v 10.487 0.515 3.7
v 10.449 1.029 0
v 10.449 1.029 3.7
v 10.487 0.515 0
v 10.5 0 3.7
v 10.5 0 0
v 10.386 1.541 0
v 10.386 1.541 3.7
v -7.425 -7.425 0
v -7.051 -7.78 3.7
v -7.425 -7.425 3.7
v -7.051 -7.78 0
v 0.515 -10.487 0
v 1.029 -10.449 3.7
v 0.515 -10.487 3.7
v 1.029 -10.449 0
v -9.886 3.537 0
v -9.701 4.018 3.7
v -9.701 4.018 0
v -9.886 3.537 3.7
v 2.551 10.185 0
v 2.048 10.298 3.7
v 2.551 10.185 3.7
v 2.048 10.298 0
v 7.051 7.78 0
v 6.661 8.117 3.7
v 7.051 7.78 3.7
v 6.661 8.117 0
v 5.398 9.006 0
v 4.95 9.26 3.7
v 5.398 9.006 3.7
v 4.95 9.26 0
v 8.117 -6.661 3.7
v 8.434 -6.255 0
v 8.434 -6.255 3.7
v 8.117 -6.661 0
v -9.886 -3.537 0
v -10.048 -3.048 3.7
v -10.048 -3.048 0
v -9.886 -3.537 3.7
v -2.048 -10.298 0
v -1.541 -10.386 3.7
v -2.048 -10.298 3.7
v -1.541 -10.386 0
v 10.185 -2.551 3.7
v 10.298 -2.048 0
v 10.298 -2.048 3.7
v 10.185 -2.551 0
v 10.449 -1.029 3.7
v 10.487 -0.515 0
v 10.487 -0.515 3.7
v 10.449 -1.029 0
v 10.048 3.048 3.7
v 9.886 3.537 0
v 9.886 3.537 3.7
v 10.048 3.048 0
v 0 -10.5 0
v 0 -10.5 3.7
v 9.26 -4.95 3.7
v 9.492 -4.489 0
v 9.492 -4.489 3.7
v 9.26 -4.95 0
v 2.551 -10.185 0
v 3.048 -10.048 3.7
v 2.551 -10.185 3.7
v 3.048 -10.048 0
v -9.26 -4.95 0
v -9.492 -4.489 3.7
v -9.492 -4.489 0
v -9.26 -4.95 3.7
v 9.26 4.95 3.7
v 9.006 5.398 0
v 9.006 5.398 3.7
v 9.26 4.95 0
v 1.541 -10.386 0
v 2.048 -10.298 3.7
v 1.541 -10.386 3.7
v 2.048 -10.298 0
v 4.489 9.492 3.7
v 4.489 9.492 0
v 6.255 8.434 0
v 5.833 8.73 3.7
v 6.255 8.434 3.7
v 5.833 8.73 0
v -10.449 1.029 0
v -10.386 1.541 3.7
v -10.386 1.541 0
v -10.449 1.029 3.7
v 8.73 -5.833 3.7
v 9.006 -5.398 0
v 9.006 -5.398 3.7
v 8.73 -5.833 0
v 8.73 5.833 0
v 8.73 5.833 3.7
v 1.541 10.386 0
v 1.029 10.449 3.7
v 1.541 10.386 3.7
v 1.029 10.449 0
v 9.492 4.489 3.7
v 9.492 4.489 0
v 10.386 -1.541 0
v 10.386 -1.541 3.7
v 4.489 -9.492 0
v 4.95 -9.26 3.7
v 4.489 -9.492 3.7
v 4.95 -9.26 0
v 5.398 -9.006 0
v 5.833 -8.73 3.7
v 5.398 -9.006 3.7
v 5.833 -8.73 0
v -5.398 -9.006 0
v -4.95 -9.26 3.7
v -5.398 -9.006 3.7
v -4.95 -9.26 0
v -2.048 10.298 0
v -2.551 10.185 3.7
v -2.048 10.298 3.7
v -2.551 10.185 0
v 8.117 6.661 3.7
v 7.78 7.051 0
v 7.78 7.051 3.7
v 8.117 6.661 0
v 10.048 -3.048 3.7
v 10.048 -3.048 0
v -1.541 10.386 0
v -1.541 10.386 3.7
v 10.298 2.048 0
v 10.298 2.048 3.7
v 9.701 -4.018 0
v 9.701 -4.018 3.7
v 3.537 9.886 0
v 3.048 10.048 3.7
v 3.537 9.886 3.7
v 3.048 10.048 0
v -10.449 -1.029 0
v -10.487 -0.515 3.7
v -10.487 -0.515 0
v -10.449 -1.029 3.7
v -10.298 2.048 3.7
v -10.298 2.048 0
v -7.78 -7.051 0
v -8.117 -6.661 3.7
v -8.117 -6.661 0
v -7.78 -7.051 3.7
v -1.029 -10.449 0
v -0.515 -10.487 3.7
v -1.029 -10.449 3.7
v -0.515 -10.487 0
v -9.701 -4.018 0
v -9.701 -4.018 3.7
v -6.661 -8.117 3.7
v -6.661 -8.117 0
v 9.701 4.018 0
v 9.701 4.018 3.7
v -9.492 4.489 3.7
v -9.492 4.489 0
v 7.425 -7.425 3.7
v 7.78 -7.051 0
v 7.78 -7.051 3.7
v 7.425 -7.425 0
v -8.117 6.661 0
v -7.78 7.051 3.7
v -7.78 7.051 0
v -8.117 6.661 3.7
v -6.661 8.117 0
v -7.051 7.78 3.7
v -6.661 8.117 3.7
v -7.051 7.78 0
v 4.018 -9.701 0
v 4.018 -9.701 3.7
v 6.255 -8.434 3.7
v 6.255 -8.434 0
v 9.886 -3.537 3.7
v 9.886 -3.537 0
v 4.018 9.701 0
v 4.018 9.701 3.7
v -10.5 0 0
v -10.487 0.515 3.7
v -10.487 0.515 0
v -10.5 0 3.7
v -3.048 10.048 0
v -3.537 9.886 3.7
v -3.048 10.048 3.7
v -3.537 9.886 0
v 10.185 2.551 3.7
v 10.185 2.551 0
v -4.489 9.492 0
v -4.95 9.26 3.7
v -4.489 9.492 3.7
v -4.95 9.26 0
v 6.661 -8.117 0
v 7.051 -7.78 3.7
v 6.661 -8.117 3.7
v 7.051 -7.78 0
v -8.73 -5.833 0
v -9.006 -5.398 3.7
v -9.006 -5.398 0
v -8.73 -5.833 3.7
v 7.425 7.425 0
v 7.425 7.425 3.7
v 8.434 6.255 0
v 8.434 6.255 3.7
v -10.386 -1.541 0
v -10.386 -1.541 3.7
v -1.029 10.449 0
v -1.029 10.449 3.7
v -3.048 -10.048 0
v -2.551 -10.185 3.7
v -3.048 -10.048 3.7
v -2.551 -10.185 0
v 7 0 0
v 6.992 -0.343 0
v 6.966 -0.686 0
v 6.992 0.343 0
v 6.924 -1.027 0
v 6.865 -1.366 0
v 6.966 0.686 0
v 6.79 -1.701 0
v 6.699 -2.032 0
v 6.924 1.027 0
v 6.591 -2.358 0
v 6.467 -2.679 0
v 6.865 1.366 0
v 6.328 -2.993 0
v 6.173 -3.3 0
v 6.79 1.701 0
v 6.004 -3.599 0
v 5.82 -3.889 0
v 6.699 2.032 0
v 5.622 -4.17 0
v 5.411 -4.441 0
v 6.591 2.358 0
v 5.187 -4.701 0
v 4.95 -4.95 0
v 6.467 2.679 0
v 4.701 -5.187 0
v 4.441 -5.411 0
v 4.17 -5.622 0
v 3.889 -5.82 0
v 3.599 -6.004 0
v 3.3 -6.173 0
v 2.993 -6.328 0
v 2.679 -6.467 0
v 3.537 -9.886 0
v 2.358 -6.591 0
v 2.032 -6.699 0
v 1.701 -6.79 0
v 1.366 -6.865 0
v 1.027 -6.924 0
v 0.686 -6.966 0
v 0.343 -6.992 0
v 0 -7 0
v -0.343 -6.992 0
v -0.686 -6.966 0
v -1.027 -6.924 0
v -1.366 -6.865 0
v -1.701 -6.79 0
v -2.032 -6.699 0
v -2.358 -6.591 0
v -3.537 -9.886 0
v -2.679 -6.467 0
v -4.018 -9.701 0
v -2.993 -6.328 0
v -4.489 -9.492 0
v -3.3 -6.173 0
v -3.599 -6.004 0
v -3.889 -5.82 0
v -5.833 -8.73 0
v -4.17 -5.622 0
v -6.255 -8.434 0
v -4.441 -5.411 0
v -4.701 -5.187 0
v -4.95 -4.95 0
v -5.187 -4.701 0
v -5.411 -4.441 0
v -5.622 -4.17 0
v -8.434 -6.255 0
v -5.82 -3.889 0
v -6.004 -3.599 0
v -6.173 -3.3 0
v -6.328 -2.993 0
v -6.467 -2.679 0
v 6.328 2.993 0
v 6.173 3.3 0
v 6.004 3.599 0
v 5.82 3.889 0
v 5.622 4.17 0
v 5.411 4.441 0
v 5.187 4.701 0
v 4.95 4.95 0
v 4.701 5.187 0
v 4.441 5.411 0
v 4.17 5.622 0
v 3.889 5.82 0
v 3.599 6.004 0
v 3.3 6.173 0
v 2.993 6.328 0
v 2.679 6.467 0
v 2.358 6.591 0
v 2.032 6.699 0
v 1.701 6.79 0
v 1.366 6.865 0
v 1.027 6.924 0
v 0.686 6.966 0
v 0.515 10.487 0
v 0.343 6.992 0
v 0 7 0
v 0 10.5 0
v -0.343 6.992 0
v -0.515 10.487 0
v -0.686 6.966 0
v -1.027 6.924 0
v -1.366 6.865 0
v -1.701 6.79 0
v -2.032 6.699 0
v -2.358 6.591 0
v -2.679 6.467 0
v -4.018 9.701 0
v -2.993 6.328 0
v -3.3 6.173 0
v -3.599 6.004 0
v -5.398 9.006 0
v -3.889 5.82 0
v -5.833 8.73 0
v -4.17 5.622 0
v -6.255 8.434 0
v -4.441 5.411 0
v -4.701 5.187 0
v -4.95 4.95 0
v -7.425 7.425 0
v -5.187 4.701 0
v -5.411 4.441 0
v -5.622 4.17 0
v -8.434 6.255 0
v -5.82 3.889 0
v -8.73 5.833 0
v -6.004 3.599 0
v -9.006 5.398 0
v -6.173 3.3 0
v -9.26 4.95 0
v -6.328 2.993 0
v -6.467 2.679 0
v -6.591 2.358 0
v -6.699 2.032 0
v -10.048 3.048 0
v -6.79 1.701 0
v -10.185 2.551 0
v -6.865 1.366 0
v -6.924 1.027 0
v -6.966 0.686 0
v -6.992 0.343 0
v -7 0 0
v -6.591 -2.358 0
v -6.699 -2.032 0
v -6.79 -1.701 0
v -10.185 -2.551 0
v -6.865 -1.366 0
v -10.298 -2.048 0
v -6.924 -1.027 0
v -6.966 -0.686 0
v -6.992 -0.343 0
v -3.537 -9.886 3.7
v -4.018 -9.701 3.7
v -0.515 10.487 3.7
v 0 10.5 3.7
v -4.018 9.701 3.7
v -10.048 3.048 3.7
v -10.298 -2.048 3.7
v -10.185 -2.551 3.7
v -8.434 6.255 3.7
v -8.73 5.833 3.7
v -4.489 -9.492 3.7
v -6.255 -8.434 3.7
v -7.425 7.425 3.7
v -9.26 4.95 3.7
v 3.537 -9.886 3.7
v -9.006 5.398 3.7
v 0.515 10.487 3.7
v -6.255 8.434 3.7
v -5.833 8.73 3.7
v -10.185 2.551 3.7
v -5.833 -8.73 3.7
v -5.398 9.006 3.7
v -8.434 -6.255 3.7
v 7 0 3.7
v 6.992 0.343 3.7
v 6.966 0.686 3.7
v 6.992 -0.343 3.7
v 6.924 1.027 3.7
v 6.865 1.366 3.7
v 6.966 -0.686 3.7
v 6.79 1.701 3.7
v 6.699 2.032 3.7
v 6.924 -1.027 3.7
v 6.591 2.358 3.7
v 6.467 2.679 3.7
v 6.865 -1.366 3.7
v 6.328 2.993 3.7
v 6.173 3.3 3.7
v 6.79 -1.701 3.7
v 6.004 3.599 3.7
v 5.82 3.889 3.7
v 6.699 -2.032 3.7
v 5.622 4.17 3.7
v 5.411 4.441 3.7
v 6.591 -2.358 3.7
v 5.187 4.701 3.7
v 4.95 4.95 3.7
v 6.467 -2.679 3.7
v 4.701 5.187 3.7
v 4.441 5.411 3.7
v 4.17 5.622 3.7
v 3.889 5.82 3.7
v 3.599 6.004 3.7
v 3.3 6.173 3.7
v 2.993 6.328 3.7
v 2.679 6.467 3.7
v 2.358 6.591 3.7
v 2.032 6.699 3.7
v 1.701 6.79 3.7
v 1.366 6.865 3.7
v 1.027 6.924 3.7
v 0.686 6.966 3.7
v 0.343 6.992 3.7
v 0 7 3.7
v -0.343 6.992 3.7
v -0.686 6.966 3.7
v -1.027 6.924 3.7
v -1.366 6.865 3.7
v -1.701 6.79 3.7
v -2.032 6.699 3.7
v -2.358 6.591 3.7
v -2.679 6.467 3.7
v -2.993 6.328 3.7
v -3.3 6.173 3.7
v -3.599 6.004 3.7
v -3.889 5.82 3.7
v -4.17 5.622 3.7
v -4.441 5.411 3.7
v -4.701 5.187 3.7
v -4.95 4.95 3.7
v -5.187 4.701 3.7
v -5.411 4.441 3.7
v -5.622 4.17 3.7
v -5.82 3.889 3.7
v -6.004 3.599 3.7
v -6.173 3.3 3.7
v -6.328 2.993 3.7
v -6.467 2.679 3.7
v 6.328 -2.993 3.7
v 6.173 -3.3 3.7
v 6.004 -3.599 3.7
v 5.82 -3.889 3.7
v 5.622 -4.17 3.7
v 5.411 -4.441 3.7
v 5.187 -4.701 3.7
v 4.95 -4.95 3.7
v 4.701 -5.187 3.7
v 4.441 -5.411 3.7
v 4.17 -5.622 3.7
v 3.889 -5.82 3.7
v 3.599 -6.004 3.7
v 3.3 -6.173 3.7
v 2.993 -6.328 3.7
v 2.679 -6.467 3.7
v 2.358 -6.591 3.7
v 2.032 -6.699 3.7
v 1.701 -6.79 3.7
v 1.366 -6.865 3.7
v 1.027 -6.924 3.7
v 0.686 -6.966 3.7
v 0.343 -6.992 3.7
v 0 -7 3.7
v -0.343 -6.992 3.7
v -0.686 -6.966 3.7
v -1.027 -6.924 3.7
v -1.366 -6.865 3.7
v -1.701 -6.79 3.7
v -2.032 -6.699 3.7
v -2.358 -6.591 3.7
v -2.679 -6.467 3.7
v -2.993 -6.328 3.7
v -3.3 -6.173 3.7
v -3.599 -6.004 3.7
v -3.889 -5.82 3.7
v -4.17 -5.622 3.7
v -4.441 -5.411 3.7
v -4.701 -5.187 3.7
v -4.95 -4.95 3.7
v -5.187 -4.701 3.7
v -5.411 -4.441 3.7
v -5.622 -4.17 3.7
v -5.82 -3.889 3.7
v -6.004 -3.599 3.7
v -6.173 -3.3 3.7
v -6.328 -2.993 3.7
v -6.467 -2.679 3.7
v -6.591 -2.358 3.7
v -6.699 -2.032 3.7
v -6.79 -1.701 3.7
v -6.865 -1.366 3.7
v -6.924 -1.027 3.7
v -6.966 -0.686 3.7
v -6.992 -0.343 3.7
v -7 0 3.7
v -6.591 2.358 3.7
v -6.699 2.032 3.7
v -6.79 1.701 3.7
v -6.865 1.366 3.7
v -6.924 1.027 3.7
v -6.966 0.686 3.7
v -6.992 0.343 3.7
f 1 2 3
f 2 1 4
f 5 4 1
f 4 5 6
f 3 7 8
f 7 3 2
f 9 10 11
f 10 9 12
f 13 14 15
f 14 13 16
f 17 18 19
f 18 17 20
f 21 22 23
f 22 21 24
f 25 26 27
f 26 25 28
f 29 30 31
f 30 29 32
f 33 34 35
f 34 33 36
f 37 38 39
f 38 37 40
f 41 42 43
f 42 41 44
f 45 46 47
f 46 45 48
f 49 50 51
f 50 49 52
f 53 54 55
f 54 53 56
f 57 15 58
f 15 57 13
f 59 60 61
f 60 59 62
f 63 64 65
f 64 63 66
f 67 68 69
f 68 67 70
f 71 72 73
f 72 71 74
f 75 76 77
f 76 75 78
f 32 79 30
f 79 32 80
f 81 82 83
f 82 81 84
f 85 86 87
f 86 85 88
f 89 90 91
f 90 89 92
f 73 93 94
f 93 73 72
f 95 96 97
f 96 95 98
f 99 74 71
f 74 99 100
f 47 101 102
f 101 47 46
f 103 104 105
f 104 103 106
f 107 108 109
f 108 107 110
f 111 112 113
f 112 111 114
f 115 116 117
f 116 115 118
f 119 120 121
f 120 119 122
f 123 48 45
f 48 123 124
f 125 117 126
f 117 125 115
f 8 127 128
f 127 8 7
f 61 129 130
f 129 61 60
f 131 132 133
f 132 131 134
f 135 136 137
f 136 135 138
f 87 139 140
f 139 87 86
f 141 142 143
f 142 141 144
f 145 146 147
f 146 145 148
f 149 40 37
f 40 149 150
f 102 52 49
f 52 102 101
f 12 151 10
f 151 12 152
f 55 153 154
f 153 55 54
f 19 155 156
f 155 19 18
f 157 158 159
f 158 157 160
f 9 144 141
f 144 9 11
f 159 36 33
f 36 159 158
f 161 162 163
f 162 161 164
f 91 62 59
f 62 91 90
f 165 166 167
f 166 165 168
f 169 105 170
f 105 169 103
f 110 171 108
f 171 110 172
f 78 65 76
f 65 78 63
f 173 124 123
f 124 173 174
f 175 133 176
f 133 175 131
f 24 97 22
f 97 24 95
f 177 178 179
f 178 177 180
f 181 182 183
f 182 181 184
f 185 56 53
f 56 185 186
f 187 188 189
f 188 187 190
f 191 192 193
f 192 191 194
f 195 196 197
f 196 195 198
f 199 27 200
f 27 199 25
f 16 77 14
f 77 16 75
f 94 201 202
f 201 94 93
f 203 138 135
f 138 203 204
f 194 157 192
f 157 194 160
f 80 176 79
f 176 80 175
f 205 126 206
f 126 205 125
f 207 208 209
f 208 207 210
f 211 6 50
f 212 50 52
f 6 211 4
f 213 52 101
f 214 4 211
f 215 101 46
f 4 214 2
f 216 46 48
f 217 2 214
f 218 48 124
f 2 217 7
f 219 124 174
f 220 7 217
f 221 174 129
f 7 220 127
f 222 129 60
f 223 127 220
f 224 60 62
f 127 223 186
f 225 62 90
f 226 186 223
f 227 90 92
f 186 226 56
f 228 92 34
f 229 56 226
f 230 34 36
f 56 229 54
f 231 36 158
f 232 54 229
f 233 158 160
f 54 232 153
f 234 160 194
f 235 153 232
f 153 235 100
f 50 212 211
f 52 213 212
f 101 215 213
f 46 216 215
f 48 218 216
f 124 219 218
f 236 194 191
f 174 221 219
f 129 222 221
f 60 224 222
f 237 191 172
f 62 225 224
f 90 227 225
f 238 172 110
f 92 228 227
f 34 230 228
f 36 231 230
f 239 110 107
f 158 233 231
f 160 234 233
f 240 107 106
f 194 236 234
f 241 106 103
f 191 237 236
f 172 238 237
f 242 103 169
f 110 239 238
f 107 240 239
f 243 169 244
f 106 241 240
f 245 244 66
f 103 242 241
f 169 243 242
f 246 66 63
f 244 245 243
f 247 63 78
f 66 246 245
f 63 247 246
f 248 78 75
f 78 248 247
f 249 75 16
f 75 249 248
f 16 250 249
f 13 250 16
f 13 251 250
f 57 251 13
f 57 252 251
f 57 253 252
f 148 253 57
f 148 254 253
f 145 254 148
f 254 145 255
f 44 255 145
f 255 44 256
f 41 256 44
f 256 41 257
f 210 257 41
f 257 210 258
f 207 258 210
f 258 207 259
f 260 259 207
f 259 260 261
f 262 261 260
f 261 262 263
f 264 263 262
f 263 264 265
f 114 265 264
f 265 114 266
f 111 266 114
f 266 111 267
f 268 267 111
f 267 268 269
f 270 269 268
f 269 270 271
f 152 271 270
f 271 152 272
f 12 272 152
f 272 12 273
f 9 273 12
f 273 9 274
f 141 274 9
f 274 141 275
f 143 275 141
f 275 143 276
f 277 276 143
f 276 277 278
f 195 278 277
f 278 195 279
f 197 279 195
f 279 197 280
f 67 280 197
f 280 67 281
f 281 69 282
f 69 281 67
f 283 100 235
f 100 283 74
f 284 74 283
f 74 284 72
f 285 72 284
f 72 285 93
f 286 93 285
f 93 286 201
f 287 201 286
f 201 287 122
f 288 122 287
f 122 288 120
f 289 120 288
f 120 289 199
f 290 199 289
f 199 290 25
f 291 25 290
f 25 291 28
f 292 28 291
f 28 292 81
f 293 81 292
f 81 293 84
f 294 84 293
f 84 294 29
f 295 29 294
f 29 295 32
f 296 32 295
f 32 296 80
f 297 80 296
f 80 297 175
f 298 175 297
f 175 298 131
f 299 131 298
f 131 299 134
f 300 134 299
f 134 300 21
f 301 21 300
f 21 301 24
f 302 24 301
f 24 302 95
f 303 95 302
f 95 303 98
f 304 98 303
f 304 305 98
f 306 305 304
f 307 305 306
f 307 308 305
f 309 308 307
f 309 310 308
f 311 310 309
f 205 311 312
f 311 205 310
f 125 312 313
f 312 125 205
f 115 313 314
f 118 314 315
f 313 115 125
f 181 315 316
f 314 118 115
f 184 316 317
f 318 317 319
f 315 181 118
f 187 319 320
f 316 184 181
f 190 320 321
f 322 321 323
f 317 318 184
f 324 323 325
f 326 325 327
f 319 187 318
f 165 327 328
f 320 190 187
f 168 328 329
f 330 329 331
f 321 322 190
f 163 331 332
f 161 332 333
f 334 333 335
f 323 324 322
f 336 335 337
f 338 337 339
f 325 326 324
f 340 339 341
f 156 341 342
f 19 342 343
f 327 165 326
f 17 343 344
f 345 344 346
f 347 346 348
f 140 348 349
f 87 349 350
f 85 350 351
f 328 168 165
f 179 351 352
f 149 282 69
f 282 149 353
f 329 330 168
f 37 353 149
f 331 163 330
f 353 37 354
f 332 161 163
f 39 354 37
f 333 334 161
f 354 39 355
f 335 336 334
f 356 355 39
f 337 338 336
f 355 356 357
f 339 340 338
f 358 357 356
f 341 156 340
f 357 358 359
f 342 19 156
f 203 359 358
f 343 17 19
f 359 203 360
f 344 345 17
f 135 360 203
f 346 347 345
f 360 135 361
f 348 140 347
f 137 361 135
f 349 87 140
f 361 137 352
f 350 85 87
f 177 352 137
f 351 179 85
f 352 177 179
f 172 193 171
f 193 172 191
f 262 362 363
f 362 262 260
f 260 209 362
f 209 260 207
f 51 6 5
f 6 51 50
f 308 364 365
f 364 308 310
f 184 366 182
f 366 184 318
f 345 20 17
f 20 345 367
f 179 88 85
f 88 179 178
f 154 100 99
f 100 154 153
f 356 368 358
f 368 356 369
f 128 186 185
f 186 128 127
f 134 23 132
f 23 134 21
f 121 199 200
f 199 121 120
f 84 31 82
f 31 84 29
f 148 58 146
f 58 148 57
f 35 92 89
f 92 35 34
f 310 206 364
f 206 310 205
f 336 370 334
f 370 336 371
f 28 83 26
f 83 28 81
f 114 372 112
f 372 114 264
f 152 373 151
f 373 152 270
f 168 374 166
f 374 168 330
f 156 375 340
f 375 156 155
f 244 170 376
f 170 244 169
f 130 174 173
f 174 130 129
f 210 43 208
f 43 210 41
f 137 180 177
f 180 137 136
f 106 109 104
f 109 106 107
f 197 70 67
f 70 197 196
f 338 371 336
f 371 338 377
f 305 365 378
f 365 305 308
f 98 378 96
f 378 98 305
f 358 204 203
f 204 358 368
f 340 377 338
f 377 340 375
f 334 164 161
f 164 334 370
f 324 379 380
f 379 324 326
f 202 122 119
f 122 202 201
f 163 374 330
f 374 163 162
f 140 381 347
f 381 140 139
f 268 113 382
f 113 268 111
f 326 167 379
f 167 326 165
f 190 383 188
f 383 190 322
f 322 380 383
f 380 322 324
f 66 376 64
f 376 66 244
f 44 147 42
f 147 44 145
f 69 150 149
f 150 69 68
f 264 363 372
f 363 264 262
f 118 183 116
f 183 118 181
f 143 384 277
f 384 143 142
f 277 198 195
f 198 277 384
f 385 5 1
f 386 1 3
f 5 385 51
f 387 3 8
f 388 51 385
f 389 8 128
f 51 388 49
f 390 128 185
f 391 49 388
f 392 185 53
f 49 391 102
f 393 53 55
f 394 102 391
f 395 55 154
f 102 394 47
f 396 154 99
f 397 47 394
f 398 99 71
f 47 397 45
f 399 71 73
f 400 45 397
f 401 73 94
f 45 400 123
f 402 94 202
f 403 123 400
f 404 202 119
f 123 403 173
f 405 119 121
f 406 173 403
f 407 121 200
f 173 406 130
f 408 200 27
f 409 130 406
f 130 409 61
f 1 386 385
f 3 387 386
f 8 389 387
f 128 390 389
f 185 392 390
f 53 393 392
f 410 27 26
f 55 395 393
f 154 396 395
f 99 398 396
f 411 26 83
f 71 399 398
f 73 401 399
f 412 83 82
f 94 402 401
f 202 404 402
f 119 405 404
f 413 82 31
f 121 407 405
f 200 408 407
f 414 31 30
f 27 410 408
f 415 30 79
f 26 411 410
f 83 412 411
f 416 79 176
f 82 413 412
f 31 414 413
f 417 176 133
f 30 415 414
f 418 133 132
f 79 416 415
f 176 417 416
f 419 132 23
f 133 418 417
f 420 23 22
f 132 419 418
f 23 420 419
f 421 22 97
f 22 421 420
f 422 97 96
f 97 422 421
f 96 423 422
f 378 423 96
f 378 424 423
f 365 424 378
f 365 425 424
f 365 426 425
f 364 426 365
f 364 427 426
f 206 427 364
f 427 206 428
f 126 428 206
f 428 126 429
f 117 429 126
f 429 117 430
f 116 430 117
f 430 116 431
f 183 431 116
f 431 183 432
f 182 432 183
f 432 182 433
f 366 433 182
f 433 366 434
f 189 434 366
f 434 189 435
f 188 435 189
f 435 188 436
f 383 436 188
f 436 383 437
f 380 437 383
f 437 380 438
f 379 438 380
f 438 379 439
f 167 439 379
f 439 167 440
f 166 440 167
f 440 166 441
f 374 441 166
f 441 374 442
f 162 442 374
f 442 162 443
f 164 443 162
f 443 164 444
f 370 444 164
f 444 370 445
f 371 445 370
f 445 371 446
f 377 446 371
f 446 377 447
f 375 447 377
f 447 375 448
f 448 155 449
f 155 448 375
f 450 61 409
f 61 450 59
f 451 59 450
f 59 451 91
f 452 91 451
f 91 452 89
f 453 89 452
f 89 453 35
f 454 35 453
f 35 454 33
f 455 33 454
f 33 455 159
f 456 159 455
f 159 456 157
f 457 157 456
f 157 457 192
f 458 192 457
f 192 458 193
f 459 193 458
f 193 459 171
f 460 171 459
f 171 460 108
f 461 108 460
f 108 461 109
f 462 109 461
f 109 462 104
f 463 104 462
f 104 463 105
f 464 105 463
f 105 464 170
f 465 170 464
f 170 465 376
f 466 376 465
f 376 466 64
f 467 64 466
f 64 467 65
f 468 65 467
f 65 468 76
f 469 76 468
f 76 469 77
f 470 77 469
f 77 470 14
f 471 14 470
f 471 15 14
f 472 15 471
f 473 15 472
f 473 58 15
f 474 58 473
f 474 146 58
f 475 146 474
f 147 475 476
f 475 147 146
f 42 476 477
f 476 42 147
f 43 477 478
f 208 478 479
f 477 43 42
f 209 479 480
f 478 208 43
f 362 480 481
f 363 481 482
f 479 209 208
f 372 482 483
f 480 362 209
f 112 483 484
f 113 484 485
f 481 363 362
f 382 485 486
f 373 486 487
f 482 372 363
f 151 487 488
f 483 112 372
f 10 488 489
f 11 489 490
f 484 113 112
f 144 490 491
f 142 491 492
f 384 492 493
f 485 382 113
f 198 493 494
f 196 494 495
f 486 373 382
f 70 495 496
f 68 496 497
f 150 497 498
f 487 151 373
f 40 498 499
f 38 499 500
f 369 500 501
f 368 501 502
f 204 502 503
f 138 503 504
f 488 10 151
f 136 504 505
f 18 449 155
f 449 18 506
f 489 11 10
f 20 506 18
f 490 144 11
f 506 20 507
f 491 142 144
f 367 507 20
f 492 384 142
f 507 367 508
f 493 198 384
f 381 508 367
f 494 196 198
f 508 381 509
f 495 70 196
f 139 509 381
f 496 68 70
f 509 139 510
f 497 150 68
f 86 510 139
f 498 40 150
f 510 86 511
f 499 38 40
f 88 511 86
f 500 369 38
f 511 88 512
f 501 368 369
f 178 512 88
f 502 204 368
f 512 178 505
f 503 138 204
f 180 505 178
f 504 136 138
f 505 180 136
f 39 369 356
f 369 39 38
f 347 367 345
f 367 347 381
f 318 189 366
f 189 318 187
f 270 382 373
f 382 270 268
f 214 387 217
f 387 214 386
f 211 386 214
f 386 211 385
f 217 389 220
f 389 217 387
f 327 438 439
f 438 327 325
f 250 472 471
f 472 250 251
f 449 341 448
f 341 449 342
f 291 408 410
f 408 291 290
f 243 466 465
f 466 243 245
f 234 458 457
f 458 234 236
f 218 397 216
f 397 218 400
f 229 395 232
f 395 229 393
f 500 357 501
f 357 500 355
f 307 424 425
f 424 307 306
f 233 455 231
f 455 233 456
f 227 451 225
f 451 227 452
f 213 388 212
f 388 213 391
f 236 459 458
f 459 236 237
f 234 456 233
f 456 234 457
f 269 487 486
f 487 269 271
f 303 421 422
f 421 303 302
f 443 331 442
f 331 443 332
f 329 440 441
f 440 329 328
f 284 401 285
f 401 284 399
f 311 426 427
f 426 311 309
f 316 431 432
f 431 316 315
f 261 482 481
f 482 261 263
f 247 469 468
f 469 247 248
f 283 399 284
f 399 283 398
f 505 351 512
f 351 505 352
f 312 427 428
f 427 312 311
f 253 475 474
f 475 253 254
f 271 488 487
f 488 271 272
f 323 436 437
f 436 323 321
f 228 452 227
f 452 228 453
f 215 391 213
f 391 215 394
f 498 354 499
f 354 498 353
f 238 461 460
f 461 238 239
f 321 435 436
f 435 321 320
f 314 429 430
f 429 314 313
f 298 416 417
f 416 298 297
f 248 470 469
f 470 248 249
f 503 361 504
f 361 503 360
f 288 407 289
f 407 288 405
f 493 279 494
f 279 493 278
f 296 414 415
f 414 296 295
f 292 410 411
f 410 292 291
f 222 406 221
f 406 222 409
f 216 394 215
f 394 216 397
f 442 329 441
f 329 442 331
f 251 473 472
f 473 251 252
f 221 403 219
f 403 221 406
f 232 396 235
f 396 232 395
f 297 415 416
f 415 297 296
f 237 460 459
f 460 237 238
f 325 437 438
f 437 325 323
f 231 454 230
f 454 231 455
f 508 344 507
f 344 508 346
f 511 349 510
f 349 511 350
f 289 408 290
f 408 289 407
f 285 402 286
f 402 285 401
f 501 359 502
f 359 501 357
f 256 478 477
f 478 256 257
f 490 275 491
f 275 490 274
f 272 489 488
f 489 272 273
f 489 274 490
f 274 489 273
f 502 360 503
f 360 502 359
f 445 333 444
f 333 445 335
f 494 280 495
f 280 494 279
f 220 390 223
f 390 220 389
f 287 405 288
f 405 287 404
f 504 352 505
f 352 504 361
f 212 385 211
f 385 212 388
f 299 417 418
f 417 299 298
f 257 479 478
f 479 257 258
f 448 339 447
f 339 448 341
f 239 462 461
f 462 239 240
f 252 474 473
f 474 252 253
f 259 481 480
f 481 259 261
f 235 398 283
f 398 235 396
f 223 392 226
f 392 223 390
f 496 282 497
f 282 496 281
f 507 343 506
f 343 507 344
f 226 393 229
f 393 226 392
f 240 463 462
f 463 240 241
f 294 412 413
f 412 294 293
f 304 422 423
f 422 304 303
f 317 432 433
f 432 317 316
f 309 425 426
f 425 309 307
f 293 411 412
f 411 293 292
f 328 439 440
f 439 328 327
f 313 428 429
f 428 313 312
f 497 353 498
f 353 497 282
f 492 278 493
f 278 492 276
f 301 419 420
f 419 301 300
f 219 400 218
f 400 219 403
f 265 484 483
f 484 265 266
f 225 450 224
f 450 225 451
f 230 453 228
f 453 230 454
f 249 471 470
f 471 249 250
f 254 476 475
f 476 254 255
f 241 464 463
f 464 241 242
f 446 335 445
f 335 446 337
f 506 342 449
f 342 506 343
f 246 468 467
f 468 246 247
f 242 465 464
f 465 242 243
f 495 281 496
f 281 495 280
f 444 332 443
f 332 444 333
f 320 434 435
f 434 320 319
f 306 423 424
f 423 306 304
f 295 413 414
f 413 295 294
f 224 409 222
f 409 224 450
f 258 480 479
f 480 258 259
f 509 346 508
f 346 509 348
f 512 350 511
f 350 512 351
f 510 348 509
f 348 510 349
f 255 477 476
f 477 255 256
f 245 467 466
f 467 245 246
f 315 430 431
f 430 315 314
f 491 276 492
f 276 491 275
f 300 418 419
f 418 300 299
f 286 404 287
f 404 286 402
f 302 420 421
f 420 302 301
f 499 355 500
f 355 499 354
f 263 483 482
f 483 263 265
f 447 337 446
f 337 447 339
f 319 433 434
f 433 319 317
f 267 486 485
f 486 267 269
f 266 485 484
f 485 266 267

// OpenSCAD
$fn = 128;

r = 10.5;
h = 3.7;
t = 3.5;

difference() {
  cylinder(r = r, h = h);
  translate([0,0,-0.01])
    cylinder(r = max(r - t, 0.01), h = h + 0.02);
}
